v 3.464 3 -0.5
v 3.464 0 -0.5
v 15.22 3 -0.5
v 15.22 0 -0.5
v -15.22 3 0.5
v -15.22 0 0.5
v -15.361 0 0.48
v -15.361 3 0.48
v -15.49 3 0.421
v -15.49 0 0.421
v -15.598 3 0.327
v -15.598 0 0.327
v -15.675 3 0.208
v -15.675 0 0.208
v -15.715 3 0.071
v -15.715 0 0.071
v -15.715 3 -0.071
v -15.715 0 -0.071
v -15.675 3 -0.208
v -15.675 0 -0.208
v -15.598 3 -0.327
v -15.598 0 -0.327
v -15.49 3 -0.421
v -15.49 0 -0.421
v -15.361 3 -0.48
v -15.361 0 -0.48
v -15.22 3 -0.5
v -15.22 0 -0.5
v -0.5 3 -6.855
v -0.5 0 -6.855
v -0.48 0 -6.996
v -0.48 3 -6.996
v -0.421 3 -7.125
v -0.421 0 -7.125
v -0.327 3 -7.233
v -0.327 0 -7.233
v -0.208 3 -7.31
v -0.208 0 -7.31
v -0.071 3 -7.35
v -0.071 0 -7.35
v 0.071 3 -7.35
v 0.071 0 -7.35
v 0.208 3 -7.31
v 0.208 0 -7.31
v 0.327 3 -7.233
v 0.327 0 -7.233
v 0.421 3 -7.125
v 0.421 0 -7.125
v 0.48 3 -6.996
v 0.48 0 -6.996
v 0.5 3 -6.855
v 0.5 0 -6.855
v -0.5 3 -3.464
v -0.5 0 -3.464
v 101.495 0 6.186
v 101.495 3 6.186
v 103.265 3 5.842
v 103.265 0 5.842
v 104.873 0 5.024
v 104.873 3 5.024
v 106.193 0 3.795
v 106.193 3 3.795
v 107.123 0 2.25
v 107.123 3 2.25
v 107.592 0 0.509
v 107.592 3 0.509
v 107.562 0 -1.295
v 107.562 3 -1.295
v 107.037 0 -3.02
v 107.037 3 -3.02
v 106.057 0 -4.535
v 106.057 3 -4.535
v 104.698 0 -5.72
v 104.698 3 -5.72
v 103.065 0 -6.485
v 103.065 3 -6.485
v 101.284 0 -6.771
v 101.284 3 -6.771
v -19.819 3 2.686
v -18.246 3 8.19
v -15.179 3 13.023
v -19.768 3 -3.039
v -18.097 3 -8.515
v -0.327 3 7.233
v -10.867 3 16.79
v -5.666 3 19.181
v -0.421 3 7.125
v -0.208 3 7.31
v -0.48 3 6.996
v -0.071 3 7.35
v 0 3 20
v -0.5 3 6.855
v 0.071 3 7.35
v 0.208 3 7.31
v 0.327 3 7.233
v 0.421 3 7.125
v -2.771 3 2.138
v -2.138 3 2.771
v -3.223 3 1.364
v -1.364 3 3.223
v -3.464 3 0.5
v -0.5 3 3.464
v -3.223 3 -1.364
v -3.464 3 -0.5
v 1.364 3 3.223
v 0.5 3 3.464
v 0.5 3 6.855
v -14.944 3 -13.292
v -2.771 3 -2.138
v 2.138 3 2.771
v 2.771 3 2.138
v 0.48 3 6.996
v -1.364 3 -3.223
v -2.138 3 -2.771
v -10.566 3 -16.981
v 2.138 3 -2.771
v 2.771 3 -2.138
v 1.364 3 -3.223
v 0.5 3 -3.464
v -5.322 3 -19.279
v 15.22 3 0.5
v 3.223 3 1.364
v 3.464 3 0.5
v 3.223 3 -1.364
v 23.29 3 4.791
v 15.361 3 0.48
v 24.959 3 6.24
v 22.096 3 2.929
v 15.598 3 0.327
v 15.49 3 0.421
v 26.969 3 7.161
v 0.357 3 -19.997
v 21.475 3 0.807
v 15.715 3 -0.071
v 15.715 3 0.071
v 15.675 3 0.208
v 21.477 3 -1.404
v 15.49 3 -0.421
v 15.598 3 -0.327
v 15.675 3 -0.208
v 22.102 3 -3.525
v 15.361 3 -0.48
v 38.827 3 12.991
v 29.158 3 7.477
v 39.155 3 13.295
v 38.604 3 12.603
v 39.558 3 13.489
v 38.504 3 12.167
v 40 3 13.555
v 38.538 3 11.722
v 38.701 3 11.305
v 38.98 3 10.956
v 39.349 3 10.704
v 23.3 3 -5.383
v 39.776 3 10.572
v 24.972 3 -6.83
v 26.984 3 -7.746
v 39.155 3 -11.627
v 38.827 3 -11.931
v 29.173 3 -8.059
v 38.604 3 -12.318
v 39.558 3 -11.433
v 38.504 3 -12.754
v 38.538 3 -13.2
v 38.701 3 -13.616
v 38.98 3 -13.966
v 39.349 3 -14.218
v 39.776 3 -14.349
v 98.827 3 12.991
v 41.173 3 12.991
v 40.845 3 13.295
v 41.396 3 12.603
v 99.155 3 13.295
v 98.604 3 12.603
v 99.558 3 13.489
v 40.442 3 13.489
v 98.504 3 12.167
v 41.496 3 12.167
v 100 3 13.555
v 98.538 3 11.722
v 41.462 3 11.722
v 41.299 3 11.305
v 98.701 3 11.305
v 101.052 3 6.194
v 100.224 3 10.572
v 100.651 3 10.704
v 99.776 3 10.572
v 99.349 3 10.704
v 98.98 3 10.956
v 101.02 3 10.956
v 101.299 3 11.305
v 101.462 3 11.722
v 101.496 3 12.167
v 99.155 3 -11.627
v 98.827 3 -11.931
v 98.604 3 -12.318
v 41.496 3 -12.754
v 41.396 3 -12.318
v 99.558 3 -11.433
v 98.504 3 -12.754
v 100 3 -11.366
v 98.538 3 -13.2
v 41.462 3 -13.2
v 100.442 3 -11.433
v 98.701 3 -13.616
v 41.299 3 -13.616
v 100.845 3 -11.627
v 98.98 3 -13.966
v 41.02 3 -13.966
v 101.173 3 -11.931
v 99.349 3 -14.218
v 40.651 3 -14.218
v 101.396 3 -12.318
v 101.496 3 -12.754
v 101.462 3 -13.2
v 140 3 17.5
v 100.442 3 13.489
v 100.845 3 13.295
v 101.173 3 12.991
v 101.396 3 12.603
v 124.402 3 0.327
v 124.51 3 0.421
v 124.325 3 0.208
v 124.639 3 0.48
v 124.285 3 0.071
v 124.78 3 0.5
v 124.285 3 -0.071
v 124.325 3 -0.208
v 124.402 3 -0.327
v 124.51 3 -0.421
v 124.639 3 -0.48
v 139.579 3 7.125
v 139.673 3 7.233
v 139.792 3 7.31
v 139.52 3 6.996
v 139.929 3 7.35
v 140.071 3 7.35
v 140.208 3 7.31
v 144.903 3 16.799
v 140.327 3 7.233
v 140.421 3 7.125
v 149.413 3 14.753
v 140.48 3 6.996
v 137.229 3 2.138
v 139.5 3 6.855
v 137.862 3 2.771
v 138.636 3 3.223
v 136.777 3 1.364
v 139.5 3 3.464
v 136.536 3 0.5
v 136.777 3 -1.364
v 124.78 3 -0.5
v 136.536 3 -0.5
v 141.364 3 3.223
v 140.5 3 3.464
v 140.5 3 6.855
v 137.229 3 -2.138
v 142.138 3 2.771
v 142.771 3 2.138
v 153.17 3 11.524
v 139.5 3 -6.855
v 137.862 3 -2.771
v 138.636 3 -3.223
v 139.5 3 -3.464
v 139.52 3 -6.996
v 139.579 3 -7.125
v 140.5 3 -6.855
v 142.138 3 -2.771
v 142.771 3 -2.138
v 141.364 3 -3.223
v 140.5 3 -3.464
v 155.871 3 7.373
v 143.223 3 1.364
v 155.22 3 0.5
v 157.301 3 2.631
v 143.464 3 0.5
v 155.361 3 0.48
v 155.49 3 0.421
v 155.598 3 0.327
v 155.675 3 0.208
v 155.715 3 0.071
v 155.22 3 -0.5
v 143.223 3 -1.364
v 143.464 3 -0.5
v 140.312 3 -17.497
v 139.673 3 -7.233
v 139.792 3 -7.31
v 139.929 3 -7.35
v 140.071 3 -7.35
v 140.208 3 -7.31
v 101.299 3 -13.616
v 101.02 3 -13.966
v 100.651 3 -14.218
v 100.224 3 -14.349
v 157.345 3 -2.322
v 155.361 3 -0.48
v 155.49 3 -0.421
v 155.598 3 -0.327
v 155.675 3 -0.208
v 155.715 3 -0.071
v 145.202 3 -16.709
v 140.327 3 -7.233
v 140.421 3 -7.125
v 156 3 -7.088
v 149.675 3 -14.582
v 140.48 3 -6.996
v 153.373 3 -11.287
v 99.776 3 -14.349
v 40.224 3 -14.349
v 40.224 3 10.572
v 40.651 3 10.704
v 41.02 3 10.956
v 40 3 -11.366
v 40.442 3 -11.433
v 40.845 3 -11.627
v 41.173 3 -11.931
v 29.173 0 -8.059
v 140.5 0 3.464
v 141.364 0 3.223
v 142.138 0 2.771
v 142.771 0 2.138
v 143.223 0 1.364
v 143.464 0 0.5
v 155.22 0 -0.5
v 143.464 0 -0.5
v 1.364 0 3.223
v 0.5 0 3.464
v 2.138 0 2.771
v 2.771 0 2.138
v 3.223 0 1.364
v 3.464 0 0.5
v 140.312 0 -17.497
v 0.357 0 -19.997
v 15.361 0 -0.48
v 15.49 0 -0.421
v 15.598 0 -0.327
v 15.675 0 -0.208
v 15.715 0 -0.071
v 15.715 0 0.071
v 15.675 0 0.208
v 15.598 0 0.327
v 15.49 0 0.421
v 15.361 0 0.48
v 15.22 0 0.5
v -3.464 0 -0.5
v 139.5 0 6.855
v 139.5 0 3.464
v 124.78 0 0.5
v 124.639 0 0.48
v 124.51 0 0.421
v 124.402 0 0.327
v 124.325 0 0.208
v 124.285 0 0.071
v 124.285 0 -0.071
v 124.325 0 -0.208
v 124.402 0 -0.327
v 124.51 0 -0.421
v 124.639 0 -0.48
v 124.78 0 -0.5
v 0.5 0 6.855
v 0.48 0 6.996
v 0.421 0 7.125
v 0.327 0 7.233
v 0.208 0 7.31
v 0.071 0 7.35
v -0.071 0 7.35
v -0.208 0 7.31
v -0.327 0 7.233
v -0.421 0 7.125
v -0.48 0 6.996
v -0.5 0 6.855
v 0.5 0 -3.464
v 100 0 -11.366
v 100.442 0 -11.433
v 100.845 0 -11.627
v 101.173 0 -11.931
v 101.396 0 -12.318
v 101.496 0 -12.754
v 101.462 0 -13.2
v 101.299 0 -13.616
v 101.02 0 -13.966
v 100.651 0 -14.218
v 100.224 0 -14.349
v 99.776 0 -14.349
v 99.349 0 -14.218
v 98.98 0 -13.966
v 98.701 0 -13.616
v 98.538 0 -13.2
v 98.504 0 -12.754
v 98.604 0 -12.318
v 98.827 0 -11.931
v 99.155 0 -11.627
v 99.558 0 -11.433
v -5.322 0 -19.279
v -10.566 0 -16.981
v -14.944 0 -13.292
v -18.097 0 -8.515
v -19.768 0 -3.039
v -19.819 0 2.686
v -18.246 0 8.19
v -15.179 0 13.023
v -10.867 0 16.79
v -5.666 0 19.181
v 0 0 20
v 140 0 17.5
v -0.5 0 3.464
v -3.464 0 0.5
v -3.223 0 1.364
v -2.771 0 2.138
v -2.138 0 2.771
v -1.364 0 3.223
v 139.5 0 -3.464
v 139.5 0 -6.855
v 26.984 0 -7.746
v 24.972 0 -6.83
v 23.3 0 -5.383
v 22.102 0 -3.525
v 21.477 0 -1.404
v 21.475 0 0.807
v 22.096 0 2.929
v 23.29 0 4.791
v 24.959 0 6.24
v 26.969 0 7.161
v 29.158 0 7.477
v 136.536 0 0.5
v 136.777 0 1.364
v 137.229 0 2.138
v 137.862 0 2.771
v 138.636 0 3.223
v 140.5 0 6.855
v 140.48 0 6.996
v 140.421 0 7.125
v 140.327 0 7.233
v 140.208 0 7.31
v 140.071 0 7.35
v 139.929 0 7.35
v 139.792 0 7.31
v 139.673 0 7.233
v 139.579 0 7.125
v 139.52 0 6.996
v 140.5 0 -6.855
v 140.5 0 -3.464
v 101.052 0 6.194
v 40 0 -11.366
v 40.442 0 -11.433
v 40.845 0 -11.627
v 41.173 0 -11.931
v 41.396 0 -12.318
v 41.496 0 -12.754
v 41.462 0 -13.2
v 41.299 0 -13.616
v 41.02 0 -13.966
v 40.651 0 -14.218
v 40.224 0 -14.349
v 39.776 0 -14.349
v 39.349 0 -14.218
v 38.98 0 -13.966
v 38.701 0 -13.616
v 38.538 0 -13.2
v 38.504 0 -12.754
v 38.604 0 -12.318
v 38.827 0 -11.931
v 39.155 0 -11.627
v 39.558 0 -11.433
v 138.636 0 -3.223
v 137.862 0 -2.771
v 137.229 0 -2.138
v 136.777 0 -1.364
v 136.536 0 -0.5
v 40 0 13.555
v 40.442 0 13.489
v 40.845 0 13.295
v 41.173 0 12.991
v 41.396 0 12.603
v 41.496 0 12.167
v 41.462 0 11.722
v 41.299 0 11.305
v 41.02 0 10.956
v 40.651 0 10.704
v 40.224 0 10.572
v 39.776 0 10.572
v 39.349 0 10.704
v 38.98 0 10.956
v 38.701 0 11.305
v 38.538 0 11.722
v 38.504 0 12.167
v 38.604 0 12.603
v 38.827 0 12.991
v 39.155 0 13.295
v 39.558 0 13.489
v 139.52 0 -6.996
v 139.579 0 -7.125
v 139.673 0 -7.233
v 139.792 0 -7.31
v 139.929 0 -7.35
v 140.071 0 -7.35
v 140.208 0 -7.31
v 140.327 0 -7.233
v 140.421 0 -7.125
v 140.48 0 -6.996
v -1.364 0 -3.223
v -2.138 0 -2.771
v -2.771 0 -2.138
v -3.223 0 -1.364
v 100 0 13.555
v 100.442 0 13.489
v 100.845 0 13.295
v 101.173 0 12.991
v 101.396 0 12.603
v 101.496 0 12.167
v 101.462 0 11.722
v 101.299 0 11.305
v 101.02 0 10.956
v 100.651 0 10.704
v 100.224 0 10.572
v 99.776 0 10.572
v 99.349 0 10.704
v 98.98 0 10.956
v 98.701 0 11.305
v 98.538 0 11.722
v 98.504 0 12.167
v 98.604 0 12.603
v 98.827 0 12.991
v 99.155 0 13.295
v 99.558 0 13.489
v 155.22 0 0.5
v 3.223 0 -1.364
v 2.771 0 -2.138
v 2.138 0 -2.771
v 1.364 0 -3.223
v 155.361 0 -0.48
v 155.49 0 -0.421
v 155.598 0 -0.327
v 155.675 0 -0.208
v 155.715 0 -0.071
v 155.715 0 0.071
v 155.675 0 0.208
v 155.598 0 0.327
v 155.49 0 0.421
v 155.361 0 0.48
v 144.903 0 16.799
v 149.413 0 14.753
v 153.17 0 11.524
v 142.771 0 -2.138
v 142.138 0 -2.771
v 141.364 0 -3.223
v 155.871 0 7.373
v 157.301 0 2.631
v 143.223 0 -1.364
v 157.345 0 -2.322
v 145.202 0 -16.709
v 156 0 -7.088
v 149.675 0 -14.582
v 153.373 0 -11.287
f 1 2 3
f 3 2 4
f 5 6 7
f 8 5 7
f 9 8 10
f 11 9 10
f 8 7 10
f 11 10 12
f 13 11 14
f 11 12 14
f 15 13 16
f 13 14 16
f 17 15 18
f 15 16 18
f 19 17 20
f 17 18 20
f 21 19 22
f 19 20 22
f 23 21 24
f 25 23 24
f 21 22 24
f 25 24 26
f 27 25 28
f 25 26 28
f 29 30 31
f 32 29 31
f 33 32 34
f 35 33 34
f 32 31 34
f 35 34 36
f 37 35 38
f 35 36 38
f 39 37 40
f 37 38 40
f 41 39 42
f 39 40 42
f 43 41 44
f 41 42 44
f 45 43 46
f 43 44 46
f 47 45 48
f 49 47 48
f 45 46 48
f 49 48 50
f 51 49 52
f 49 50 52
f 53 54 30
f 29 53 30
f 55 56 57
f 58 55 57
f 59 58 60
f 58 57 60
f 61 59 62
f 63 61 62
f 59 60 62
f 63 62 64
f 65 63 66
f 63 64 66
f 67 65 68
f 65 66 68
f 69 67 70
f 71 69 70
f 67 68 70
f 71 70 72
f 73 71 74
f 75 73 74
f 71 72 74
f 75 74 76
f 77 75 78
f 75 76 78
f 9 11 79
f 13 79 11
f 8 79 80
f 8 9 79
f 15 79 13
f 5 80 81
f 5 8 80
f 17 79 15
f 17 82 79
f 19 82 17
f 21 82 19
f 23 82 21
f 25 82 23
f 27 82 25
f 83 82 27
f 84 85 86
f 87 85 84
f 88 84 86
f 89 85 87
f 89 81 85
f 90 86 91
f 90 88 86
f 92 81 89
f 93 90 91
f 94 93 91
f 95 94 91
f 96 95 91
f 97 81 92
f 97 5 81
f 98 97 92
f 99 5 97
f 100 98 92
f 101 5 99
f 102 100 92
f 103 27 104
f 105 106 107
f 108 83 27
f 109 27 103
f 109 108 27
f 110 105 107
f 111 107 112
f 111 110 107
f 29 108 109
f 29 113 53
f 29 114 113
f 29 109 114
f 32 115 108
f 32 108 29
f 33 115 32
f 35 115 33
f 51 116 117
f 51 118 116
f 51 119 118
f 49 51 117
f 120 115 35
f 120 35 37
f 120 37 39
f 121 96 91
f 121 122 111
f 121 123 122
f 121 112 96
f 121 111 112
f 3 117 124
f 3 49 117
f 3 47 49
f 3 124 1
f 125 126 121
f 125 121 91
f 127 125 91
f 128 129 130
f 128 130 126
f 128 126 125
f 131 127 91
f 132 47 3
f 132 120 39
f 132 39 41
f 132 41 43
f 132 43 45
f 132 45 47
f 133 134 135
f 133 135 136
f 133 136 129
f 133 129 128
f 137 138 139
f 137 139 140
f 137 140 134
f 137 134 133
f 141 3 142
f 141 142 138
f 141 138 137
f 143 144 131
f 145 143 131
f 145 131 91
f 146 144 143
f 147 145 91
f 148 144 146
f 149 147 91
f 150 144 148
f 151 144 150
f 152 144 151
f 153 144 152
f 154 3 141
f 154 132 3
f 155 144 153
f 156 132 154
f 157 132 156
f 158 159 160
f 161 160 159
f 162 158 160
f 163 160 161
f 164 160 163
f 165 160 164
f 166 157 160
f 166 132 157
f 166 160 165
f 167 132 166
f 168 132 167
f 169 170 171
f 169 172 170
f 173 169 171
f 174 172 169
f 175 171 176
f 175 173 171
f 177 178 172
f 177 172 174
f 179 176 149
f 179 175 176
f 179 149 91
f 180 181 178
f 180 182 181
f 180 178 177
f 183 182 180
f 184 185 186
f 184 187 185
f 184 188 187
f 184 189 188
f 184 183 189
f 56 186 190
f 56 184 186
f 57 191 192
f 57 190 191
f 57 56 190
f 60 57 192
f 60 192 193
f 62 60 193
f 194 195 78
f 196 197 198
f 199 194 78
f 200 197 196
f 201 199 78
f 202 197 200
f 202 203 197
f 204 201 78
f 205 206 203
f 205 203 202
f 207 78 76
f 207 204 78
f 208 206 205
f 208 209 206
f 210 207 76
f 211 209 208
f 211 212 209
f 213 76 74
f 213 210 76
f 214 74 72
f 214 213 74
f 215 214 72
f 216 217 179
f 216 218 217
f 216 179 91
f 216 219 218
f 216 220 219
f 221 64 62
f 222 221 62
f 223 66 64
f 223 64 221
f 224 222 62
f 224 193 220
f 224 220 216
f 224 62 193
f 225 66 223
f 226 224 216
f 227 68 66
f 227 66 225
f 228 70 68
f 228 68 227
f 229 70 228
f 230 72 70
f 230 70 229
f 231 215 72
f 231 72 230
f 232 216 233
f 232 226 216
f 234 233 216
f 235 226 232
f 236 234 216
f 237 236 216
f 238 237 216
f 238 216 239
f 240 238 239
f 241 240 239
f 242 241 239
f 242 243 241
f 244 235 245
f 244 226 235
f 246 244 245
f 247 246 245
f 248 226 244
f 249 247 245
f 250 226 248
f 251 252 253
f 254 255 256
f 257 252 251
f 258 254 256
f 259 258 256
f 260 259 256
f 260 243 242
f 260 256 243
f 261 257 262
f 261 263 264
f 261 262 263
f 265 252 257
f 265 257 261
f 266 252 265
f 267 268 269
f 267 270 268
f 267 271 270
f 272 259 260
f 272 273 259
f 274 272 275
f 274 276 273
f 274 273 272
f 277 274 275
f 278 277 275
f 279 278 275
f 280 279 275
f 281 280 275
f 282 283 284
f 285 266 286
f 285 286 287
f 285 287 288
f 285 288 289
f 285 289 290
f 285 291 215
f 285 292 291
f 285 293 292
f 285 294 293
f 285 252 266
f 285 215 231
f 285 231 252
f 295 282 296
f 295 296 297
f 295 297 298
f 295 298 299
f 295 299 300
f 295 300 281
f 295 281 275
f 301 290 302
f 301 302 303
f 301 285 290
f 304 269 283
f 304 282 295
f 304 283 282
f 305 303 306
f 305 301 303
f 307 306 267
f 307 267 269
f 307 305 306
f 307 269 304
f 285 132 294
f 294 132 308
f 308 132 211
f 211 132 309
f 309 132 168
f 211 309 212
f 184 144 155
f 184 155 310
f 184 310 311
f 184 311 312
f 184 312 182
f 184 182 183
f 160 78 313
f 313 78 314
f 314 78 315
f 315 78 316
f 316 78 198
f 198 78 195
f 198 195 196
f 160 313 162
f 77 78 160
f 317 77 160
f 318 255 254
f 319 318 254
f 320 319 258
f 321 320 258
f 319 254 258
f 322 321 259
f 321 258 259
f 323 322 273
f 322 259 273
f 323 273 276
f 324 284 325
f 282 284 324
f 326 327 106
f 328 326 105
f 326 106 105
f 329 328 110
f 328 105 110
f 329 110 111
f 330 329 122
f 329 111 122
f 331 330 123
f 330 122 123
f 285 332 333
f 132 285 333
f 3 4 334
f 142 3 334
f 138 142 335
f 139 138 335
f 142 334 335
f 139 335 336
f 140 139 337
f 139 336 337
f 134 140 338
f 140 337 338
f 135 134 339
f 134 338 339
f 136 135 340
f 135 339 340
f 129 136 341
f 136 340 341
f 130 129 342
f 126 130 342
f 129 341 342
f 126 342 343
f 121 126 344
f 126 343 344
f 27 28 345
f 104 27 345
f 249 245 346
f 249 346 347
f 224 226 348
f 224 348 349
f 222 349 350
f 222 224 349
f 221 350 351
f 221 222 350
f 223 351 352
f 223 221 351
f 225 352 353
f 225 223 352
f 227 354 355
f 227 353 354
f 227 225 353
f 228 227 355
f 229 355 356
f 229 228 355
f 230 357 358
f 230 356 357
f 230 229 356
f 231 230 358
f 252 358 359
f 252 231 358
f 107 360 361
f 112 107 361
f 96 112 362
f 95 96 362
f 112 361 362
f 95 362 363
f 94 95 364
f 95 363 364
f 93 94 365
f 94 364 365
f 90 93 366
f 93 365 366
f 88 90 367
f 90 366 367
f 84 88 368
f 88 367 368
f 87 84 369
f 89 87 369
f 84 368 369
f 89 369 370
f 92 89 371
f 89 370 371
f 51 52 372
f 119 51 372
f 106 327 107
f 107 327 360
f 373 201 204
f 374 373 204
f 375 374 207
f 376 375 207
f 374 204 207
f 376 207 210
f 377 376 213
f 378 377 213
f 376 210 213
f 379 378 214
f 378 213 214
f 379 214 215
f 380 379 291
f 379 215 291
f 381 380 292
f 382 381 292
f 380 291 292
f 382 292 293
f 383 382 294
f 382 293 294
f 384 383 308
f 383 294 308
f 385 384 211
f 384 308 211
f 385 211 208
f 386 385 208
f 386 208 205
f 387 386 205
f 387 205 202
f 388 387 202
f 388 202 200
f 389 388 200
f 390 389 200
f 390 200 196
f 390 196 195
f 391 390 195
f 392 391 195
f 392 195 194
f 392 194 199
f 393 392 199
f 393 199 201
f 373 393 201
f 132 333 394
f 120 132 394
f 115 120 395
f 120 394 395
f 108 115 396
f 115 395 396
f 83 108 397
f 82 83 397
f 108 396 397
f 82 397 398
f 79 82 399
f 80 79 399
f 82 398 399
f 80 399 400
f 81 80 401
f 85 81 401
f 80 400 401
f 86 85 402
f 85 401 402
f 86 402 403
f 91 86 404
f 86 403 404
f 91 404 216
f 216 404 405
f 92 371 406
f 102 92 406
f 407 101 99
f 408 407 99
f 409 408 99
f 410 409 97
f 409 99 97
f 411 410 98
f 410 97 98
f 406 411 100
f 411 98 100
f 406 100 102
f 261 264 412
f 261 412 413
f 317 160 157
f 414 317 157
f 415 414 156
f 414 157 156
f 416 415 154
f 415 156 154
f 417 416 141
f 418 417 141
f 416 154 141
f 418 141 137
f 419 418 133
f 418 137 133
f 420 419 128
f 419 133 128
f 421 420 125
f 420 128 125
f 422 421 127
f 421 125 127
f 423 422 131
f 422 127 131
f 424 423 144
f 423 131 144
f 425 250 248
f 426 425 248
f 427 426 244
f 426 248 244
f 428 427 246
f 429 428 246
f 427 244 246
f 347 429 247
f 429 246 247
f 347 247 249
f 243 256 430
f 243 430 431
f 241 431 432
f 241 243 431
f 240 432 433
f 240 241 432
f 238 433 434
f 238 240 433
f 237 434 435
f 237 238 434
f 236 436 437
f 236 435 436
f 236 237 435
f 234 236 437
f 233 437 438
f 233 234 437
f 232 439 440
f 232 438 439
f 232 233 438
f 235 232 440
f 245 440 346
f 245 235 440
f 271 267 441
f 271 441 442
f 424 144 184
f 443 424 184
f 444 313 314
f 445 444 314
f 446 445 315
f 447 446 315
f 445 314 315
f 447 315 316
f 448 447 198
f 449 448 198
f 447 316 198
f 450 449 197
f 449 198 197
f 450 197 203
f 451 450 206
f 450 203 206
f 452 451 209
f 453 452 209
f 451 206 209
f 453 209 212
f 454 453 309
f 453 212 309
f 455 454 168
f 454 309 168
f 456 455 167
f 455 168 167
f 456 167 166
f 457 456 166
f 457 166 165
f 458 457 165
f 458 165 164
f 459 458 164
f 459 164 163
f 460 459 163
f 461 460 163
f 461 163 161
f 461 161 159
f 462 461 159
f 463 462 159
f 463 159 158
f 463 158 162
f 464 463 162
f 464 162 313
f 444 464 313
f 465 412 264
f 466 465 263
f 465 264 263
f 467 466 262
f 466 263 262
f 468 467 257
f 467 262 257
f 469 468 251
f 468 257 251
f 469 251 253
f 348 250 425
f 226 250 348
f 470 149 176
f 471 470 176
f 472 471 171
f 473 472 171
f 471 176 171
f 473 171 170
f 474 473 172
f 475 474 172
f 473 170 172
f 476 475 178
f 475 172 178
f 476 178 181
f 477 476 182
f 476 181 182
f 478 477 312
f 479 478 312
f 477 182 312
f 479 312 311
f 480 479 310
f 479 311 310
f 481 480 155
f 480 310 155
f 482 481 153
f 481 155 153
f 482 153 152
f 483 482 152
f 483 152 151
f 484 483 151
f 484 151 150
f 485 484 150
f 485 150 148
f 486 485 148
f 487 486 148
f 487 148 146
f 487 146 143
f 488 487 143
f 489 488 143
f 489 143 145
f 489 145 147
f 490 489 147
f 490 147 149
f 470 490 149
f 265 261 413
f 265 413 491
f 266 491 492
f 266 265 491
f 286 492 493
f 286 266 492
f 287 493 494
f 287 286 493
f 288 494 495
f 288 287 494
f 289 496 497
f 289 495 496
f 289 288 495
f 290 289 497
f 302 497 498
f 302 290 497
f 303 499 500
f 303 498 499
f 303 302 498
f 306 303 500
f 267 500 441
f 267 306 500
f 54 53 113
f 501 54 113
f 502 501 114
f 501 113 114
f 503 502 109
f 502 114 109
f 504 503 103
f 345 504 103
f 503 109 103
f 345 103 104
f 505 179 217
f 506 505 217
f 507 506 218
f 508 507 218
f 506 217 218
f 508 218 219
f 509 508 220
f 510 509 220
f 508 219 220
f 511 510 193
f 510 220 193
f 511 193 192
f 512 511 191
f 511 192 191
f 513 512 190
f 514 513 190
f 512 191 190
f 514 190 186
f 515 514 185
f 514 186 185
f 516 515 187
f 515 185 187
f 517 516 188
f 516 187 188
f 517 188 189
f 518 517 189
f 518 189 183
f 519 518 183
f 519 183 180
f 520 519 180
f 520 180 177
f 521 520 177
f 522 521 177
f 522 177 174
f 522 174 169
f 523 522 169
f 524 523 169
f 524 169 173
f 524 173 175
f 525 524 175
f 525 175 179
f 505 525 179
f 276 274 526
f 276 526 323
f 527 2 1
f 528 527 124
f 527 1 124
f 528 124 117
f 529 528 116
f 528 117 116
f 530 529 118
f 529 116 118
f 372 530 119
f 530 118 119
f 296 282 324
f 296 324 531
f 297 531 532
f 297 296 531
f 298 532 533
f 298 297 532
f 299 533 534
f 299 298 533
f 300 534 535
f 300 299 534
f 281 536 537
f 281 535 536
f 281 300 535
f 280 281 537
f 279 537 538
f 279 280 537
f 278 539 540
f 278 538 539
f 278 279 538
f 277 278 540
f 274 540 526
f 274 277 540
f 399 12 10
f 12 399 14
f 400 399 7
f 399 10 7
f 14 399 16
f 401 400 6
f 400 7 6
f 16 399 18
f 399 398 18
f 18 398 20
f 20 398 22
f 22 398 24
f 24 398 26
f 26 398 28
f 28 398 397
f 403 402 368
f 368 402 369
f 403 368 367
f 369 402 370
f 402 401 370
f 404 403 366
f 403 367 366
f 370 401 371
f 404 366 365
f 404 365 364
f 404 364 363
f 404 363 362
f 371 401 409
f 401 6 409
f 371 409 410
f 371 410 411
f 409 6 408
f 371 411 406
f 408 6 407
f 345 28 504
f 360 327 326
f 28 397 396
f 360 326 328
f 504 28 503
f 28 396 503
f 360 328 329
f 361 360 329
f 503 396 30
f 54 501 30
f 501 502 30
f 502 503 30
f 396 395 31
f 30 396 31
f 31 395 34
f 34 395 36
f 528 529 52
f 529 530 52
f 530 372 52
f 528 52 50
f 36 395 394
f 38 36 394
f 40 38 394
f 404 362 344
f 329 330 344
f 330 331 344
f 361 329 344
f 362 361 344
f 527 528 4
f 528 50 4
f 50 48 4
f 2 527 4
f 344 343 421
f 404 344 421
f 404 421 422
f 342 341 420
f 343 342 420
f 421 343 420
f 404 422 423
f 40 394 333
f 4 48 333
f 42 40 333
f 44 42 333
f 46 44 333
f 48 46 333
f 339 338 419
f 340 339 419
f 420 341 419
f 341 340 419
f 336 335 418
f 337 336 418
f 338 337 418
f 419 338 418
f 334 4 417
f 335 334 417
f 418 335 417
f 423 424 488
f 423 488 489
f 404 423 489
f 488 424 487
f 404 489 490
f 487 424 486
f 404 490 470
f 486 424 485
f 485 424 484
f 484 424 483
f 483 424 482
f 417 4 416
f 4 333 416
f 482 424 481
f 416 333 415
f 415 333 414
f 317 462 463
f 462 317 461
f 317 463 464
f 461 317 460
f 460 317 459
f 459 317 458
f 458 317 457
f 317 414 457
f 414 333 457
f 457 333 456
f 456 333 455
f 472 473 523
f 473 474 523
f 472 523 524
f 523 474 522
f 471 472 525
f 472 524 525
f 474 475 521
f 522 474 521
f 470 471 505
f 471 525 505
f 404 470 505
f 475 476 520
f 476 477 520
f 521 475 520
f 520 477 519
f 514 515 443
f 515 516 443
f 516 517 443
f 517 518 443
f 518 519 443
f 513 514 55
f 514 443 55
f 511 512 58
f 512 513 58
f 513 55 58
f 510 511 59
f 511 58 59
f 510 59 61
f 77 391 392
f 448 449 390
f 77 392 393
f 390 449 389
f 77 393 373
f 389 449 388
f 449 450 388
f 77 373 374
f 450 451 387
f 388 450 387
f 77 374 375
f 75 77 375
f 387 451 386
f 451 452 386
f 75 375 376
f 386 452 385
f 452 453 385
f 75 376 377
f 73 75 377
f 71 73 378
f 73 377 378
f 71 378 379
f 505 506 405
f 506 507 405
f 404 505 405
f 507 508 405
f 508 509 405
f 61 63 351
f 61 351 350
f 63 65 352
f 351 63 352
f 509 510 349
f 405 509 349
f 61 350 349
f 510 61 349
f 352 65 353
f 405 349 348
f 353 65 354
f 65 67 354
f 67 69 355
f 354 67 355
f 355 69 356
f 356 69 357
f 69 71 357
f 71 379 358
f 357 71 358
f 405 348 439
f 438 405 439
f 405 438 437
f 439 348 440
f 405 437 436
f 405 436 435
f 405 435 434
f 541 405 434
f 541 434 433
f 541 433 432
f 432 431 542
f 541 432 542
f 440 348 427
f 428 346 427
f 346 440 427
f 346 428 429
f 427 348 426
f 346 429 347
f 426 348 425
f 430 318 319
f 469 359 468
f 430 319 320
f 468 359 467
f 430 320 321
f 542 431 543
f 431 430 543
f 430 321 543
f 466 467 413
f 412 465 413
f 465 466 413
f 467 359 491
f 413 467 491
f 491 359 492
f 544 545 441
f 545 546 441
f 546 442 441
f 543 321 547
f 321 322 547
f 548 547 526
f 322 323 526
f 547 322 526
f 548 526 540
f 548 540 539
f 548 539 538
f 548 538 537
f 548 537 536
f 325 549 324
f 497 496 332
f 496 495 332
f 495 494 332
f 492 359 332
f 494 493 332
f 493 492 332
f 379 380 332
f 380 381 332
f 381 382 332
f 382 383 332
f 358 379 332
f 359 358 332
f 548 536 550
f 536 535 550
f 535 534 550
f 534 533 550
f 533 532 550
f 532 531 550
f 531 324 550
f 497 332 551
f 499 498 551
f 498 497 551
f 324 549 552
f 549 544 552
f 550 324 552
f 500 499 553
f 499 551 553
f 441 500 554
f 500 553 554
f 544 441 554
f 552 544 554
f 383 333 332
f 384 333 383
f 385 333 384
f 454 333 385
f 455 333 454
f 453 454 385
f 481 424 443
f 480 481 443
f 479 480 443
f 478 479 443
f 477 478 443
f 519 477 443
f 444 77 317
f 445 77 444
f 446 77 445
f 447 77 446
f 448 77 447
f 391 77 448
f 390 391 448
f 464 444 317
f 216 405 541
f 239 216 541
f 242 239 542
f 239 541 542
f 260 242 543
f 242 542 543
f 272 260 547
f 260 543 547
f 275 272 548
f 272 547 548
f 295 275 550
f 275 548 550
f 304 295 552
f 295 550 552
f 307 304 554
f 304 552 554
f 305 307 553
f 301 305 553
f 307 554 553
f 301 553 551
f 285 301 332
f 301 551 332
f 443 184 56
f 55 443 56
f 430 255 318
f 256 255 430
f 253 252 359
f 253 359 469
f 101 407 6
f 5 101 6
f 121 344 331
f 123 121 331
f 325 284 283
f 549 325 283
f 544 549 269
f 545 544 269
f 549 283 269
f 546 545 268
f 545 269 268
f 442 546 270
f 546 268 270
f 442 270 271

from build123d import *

# Parameters (mm, degrees)
BOSS_EXTRUDE1_DEPTH = 3
SKETCH2_R           = 3.4
SKETCH2_R_2         = 3.375
CUT_EXTRUDE1_DEPTH  = 159.793104384
CUT_EXTRUDE3_DEPTH  = 159.793104384
CUT_EXTRUDE4_DEPTH  = 159.793104384
CUT_EXTRUDE5_DEPTH  = 159.793104384
SKETCH8_R           = 3.5
CUT_EXTRUDE6_DEPTH  = 159.793104384
SKETCH10_R          = 1.5
CUT_EXTRUDE7_DEPTH  = 10


with BuildPart() as part:
    # Sketch1 → Boss-Extrude1 (new body)
    with BuildSketch(Plane(origin=(0, 0, 0), x_dir=(1, 0, 0), z_dir=(0, 1, 0))):
        with BuildLine():
            Line((140.3125, 17.497209599), (0.357142857, 19.99681097))
            ThreePointArc((0.357142857, 19.99681097), (-19.999202727, 0.178578547), (0, -20))
            Line((0, -20), (140, -17.5))
            ThreePointArc((140, -17.5), (157.499302386, -0.156256229), (140.3125, 17.497209599))
        make_face()
    extrude(amount=BOSS_EXTRUDE1_DEPTH)

    # Sketch2 → Cut-Extrude1 (cut, through all)
    with BuildSketch(Plane(origin=(0, 3, 0), x_dir=(1, 0, 0), z_dir=(0, 1, 0))):
        with Locations(Location((0, 0, 0), (0, 0, 270))):
            Circle(SKETCH2_R)
        with Locations(Location((140, 0, 0), (0, 0, 270))):
            Circle(SKETCH2_R_2)
    extrude(amount=-CUT_EXTRUDE1_DEPTH, mode=Mode.SUBTRACT)

    # Sketch4 → Cut-Extrude3 (cut, through all)
    with BuildSketch(Plane(origin=(0, 3, 0), x_dir=(1, 0, 0), z_dir=(0, 1, 0))):
        with BuildLine():
            ThreePointArc((101.494647455, -6.185682468), (107.64017994, 0.394224207), (101.283865867, 6.770744637))
            Line((101.283865867, 6.770744637), (29.173044697, 8.058643229))
            ThreePointArc((29.173044697, 8.058643229), (21.397292905, 0.29833633), (29.157599804, -7.477415462))
            Line((29.157599804, -7.477415462), (101.052392136, -6.193579885))
            Line((101.052392136, -6.193579885), (101.494647455, -6.185682468))
        make_face()
    extrude(amount=-CUT_EXTRUDE3_DEPTH, mode=Mode.SUBTRACT)

    # Sketch6 → Cut-Extrude4 (cut, through all)
    with BuildSketch(Plane(origin=(0, 0, 0), x_dir=(1, 0, 0), z_dir=(0, 1, 0))):
        with BuildLine():
            Line((-15.22, 0.5), (15.22, 0.5))
            ThreePointArc((15.22, 0.5), (15.72, 0), (15.22, -0.5))
            Line((15.22, -0.5), (-15.22, -0.5))
            ThreePointArc((-15.22, -0.5), (-15.72, 0), (-15.22, 0.5))
        make_face()
        with BuildLine():
            Line((-0.5, -6.855), (-0.5, 6.855))
            ThreePointArc((-0.5, 6.855), (0, 7.355), (0.5, 6.855))
            Line((0.5, 6.855), (0.5, -6.855))
            ThreePointArc((0.5, -6.855), (0, -7.355), (-0.5, -6.855))
        make_face()
    extrude(amount=CUT_EXTRUDE4_DEPTH, mode=Mode.SUBTRACT)

    # Sketch7 → Cut-Extrude5 (cut, through all)
    with BuildSketch(Plane(origin=(0, 3, 0), x_dir=(1, 0, 0), z_dir=(0, 1, 0))):
        with BuildLine():
            Line((155.22, -0.5), (124.78, -0.5))
            ThreePointArc((124.78, -0.5), (124.28, 0), (124.78, 0.5))
            Line((124.78, 0.5), (155.22, 0.5))
            ThreePointArc((155.22, 0.5), (155.72, 0), (155.22, -0.5))
        make_face()
        with BuildLine():
            Line((139.5, -6.855), (139.5, 6.855))
            ThreePointArc((139.5, 6.855), (140, 7.355), (140.5, 6.855))
            Line((140.5, 6.855), (140.5, -6.855))
            ThreePointArc((140.5, -6.855), (140, -7.355), (139.5, -6.855))
        make_face()
    extrude(amount=-CUT_EXTRUDE5_DEPTH, mode=Mode.SUBTRACT)

    # Sketch8 → Cut-Extrude6 (cut, through all)
    with BuildSketch(Plane(origin=(0, 3, 0), x_dir=(1, 0, 0), z_dir=(0, 1, 0))):
        Circle(SKETCH8_R)
        with Locations((140, 0)):
            Circle(SKETCH8_R)
    extrude(amount=-CUT_EXTRUDE6_DEPTH, mode=Mode.SUBTRACT)

    # Sketch10 → Cut-Extrude7 (cut)
    with BuildSketch(Plane(origin=(0, 3, 0), x_dir=(1, 0, 0), z_dir=(0, 1, 0))):
        with Locations(Location((40, 12.866071293, 0), (0, 0, 270))):
            Circle(SKETCH10_R)
        with Locations(Location((40, -12.055388552, 0), (0, 0, 270))):
            Circle(SKETCH10_R)
        with Locations(Location((100, -12.055388552, 0), (0, 0, 270))):
            Circle(SKETCH10_R)
        with Locations(Location((100, 12.866071293, 0), (0, 0, 270))):
            Circle(SKETCH10_R)
    extrude(amount=-CUT_EXTRUDE7_DEPTH, mode=Mode.SUBTRACT)


solid = part.part
